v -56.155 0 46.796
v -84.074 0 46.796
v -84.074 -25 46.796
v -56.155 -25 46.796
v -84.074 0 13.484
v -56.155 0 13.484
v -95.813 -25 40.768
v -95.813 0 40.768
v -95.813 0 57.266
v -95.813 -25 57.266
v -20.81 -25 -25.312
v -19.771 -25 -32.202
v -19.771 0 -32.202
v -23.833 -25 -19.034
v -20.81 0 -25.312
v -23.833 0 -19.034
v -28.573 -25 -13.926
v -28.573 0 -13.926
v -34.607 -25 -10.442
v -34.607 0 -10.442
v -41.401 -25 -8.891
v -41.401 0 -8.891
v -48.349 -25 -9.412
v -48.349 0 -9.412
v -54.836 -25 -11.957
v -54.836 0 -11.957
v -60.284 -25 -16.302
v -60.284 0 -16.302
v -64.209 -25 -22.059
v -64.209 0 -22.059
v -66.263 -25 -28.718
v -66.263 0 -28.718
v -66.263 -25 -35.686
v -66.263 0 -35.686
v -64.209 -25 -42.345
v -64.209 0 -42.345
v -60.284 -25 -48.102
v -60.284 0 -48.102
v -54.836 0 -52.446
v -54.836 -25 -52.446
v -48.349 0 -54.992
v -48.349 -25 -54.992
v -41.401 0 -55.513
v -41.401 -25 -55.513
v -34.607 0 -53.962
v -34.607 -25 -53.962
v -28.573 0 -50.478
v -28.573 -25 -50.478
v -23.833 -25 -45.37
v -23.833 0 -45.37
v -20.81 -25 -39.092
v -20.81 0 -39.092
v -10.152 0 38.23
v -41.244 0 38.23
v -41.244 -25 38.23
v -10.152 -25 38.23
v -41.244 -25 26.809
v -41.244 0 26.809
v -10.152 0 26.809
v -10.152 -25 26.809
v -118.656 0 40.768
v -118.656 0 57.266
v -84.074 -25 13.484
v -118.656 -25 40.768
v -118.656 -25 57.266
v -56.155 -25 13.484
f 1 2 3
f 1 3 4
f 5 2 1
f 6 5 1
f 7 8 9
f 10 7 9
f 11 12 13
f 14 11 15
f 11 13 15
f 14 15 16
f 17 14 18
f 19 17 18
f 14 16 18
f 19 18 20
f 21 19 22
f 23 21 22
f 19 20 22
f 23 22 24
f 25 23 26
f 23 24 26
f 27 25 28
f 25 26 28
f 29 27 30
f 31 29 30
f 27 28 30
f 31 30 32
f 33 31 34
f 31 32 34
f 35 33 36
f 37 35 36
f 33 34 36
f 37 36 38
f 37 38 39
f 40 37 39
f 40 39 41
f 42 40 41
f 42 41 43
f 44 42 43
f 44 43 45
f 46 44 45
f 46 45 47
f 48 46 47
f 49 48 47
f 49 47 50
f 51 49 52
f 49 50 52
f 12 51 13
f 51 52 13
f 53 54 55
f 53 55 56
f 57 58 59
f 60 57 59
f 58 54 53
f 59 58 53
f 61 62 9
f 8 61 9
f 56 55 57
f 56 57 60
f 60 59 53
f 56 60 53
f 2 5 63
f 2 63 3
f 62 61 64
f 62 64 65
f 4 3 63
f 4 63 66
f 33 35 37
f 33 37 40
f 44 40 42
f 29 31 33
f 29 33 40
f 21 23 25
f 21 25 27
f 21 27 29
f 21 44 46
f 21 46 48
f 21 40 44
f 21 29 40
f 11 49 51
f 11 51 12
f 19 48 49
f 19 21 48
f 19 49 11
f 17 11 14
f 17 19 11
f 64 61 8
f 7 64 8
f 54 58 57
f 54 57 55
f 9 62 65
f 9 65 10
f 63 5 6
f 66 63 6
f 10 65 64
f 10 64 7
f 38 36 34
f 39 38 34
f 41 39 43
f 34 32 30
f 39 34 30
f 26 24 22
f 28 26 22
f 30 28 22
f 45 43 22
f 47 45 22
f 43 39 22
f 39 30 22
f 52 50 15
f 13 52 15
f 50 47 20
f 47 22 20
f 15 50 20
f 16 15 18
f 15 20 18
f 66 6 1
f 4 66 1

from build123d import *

# Parameters (mm, degrees)
F0_W     = 22.84278
F0_H     = 16.497556
F0_W_2   = 27.918949
F0_H_2   = 33.312377
F0_W_3   = 31.091554
F0_H_3   = 11.421384
F0_R     = 23.376327
F1_DEPTH = 25


with BuildPart() as f1:
    # F0 (on Front) → F1 (new body)
    with BuildSketch(Plane.XZ):
        with Locations((-107.234135, 49.016787)):
            Rectangle(F0_W, F0_H)
        with Locations((-70.114627, 30.139772)):
            Rectangle(F0_W_2, F0_H_2)
        with Locations((-25.698123, 32.519228)):
            Rectangle(F0_W_3, F0_H_3)
        with Locations((-43.147463, -32.201964)):
            Circle(F0_R)
    extrude(amount=F1_DEPTH)


solid = f1.part
